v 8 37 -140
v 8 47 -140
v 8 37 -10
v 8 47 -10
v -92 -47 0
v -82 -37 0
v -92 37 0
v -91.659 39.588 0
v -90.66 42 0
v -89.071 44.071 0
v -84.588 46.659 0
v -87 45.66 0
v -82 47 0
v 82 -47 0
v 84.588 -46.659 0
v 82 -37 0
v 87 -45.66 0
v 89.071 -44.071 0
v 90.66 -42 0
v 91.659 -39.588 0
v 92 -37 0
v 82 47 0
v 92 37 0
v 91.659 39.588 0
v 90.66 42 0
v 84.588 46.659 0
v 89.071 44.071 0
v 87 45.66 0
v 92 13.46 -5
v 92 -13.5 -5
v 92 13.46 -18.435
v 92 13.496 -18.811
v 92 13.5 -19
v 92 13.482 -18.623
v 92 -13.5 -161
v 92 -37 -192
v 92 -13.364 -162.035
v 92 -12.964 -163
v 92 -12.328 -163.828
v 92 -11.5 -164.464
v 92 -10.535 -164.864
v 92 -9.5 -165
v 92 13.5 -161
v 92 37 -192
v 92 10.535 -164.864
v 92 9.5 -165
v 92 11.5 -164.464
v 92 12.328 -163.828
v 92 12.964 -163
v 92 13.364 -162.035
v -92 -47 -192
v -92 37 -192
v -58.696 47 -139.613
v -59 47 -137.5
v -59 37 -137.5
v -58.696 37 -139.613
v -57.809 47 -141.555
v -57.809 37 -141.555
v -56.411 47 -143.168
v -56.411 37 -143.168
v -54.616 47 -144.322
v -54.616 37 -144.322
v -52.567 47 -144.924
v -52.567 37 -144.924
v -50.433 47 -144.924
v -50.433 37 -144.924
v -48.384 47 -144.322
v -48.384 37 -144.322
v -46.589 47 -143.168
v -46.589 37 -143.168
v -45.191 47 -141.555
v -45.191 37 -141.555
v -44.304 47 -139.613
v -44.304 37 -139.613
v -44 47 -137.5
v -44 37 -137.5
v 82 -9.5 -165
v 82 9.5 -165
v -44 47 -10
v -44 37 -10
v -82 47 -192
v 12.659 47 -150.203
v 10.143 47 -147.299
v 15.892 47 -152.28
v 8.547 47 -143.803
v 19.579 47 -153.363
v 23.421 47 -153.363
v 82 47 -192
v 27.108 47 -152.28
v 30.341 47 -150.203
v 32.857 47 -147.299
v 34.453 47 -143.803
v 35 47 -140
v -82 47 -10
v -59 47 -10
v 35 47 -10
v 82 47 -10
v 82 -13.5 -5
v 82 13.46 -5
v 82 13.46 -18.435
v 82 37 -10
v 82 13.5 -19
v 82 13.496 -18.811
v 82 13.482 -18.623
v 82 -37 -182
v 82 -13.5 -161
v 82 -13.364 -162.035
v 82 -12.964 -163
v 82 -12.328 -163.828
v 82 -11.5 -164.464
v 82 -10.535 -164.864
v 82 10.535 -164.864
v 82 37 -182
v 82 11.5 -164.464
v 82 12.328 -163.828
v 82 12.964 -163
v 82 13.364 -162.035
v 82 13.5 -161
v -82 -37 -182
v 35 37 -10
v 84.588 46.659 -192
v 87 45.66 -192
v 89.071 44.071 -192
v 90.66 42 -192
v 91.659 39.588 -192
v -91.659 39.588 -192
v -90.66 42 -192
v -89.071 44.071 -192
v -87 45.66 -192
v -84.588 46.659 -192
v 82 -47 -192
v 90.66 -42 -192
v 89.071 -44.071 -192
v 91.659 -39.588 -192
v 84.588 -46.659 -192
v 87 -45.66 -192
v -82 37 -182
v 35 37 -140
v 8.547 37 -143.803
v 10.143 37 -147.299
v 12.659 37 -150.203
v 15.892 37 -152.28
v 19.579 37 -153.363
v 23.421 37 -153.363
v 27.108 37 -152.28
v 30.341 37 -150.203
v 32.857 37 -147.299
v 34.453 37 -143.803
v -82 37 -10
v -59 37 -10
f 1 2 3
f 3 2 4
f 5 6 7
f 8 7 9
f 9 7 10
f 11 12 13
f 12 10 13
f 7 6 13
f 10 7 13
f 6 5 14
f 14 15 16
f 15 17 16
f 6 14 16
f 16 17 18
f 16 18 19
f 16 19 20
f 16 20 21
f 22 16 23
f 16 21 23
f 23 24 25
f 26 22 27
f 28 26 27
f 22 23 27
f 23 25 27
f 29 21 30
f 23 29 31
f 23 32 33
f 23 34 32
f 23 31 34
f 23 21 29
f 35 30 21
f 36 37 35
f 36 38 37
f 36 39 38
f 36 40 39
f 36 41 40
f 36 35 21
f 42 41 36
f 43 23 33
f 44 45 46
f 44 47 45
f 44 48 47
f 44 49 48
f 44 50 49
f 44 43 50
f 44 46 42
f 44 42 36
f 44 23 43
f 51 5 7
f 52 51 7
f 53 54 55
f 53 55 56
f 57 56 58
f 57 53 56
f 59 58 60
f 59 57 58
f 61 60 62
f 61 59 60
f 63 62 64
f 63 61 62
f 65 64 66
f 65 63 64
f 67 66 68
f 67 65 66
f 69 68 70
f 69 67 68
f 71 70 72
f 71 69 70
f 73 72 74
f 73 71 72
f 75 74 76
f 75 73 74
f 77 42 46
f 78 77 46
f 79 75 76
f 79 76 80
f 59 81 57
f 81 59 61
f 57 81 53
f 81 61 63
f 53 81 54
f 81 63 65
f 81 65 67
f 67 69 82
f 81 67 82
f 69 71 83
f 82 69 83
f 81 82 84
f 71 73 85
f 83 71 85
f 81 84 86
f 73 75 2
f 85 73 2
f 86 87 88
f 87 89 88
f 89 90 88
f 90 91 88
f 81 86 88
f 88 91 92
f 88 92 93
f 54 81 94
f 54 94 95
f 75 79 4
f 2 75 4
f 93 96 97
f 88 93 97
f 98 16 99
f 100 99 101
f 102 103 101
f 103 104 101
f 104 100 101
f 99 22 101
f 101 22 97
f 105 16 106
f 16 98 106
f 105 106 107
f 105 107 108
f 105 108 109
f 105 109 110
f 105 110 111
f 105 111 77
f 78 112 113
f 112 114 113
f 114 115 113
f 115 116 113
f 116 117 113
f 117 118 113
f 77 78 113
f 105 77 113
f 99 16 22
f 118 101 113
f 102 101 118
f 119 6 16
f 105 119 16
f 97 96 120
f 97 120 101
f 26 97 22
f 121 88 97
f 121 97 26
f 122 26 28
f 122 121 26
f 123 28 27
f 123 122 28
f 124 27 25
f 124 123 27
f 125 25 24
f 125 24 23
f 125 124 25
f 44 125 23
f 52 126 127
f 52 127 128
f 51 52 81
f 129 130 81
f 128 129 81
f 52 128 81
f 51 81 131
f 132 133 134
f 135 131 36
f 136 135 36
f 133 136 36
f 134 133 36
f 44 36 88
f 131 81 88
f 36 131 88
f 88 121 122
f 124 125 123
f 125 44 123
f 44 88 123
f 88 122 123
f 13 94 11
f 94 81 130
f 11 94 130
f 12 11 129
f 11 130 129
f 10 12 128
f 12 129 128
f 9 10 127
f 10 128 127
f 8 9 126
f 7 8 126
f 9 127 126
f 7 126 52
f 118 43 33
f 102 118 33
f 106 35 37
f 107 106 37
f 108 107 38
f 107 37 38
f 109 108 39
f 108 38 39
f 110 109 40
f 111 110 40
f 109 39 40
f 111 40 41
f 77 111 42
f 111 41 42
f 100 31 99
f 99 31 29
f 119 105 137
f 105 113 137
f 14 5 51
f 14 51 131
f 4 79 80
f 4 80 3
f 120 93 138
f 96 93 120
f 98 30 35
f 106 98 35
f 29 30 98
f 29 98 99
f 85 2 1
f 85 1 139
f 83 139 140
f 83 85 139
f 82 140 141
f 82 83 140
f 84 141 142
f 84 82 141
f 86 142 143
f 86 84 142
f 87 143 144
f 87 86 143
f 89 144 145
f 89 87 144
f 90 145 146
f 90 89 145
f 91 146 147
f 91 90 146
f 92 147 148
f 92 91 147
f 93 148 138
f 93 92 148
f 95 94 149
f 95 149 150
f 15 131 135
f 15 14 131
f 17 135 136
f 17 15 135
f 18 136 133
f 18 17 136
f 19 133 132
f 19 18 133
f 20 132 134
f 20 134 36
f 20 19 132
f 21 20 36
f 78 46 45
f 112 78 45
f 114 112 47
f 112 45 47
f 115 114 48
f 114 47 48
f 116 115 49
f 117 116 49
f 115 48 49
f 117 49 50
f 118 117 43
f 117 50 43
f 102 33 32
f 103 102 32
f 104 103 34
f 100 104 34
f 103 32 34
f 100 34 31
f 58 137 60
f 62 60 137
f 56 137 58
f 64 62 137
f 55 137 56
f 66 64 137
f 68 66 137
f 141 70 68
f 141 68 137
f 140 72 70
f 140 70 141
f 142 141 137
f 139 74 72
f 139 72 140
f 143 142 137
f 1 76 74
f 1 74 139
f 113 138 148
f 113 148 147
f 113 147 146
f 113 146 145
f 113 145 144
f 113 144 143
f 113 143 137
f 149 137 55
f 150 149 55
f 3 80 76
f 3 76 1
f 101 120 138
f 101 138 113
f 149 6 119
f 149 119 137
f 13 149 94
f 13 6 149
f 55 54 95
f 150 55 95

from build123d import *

# Parameters (mm, degrees)
SKETCH_1_W          = 184
SKETCH_1_H          = 94
SKETCH_1_W_2        = 164
SKETCH_1_H_2        = 74
EXTRUDE_1_DEPTH     = 192
SKETCH_2_W          = 184
SKETCH_2_H          = 94
EXTRUDE_2_DEPTH     = 10
CUT_EXTRUDE_1_REACH = 234.732
CUT_EXTRUDE_2_REACH = 272.054
CUT_EXTRUDE_3_DEPTH = 10
CUT_EXTRUDE_4_DEPTH = 10
SKETCH_8_W          = 5
SKETCH_8_H          = 26.959910705
EXTRUDE_4_DEPTH     = 10
SKETCH_9_W          = 52
SKETCH_9_H          = 10
SKETCH_9_W_2        = 23
SKETCH_9_W_3        = 47
CUT_EXTRUDE_5_DEPTH = 10
FILLET_1_R          = 10


with BuildPart() as part:
    # 草图1 → 凸台-拉伸1 (new body)
    with BuildSketch(Plane.XY):
        Rectangle(SKETCH_1_W, SKETCH_1_H)
        Rectangle(SKETCH_1_W_2, SKETCH_1_H_2, mode=Mode.SUBTRACT)
    extrude(amount=-EXTRUDE_1_DEPTH)

    # 草图2 → 凸台-拉伸2 (add)
    with BuildSketch(Plane(origin=(0, 0, -192), x_dir=(-1, 0, 0), z_dir=(0, 0, -1))):
        Rectangle(SKETCH_2_W, SKETCH_2_H)
    extrude(amount=-EXTRUDE_2_DEPTH)

    # 草图3 → 切除-拉伸1 (cut, up to next)
    with BuildSketch(Plane(origin=(0, 47, 0), x_dir=(1, 0, 0), z_dir=(0, 1, 0)), mode=Mode.PRIVATE) as cut_extrude_1_sk1:
        with BuildLine():
            Line((35, 140), (35, 40))
            ThreePointArc((35, 40), (21.5, 26.5), (8, 40))
            Line((8, 40), (8, 140))
            ThreePointArc((8, 140), (21.5, 153.5), (35, 140))
        make_face()
    cut_extrude_1_tool1 = extrude(cut_extrude_1_sk1.sketch, amount=-CUT_EXTRUDE_1_REACH, mode=Mode.PRIVATE) & part.part
    # 草图3 → 切除-拉伸1 (cut, up to next)
    with BuildSketch(Plane(origin=(0, 47, 0), x_dir=(1, 0, 0), z_dir=(0, 1, 0)), mode=Mode.PRIVATE) as cut_extrude_1_sk2:
        with BuildLine():
            Line((-59, 42.5), (-59, 137.5))
            ThreePointArc((-59, 137.5), (-51.5, 145), (-44, 137.5))
            Line((-44, 137.5), (-44, 42.5))
            ThreePointArc((-44, 42.5), (-51.5, 35), (-59, 42.5))
        make_face()
    cut_extrude_1_tool2 = extrude(cut_extrude_1_sk2.sketch, amount=-CUT_EXTRUDE_1_REACH, mode=Mode.PRIVATE) & part.part
    add(cut_extrude_1_tool1.solids().sort_by_distance((21.5, 47, -90))[0], mode=Mode.SUBTRACT)
    add(cut_extrude_1_tool2.solids().sort_by_distance((-51.5, 47, -90))[0], mode=Mode.SUBTRACT)

    # 草图4 → 切除-拉伸2 (cut, up to next)
    with BuildSketch(Plane(origin=(92, 0, 0), x_dir=(0, 0, -1), z_dir=(1, 0, 0)), mode=Mode.PRIVATE) as cut_extrude_2_sk1:
        with BuildLine():
            Line((15, 9.5), (15, -9.5))
            ThreePointArc((15, -9.5), (16.171572875, -12.328427125), (19, -13.5))
            Line((19, -13.5), (161, -13.5))
            ThreePointArc((161, -13.5), (163.828427125, -12.328427125), (165, -9.5))
            Line((165, -9.5), (165, 9.5))
            ThreePointArc((165, 9.5), (163.828427125, 12.328427125), (161, 13.5))
            Line((161, 13.5), (19, 13.5))
            ThreePointArc((19, 13.5), (16.171572875, 12.328427125), (15, 9.5))
        make_face()
    cut_extrude_2_tool1 = extrude(cut_extrude_2_sk1.sketch, amount=-CUT_EXTRUDE_2_REACH, mode=Mode.PRIVATE) & part.part
    add(cut_extrude_2_tool1.solids().sort_by_distance((92, 0, -90))[0], mode=Mode.SUBTRACT)

    # 草图5 → 切除-拉伸3 (cut)
    with BuildSketch(Plane(origin=(0, 47, 0), x_dir=(1, 0, 0), z_dir=(0, 1, 0))):
        with BuildLine():
            ThreePointArc((35, 40), (21.5, 26.5), (8, 40))
            Line((8, 40), (8, 0))
            Line((8, 0), (35, 0))
            Line((35, 0), (35, 40))
        make_face()
        with BuildLine():
            Line((-59, 0), (-44, 0))
            Line((-44, 0), (-44, 42.5))
            ThreePointArc((-44, 42.5), (-51.5, 35), (-59, 42.5))
            Line((-59, 42.5), (-59, 0))
        make_face()
    extrude(amount=-CUT_EXTRUDE_3_DEPTH, mode=Mode.SUBTRACT)

    # 草图7 → 切除-拉伸4 (cut)
    with BuildSketch(Plane(origin=(92, 0, 0), x_dir=(0, 0, -1), z_dir=(1, 0, 0))):
        Polygon((18.435104252, 13.459910705), (-12.830882311, 13.459910705), (-16.882855926, -13.5), (19, -13.5), align=None)
    extrude(amount=-CUT_EXTRUDE_4_DEPTH, mode=Mode.SUBTRACT)

    # 草图8 → 凸台-拉伸4 (add)
    with BuildSketch(Plane(origin=(92, 0, 0), x_dir=(0, 0, -1), z_dir=(1, 0, 0))):
        with Locations((2.5, -0.020044647)):
            Rectangle(SKETCH_8_W, SKETCH_8_H)
    extrude(amount=-EXTRUDE_4_DEPTH)

    # 草图9 → 切除-拉伸5 (cut)
    with BuildSketch(Plane(origin=(0, 47, 0), x_dir=(1, 0, 0), z_dir=(0, 1, 0))):
        with Locations((-18, 5)):
            Rectangle(SKETCH_9_W, SKETCH_9_H)
        with Locations((-70.5, 5)):
            Rectangle(SKETCH_9_W_2, SKETCH_9_H)
        with Locations((58.5, 5)):
            Rectangle(SKETCH_9_W_3, SKETCH_9_H)
    extrude(amount=-CUT_EXTRUDE_5_DEPTH, mode=Mode.SUBTRACT)

    # 圆角1
    fillet_1_edges = [part.edges().sort_by_distance(p)[0] for p in [
        (-92, 47, -96),
        (92, 47, -96),
        (92, -47, -96),
    ]]
    fillet(fillet_1_edges, radius=FILLET_1_R)


solid = part.part
